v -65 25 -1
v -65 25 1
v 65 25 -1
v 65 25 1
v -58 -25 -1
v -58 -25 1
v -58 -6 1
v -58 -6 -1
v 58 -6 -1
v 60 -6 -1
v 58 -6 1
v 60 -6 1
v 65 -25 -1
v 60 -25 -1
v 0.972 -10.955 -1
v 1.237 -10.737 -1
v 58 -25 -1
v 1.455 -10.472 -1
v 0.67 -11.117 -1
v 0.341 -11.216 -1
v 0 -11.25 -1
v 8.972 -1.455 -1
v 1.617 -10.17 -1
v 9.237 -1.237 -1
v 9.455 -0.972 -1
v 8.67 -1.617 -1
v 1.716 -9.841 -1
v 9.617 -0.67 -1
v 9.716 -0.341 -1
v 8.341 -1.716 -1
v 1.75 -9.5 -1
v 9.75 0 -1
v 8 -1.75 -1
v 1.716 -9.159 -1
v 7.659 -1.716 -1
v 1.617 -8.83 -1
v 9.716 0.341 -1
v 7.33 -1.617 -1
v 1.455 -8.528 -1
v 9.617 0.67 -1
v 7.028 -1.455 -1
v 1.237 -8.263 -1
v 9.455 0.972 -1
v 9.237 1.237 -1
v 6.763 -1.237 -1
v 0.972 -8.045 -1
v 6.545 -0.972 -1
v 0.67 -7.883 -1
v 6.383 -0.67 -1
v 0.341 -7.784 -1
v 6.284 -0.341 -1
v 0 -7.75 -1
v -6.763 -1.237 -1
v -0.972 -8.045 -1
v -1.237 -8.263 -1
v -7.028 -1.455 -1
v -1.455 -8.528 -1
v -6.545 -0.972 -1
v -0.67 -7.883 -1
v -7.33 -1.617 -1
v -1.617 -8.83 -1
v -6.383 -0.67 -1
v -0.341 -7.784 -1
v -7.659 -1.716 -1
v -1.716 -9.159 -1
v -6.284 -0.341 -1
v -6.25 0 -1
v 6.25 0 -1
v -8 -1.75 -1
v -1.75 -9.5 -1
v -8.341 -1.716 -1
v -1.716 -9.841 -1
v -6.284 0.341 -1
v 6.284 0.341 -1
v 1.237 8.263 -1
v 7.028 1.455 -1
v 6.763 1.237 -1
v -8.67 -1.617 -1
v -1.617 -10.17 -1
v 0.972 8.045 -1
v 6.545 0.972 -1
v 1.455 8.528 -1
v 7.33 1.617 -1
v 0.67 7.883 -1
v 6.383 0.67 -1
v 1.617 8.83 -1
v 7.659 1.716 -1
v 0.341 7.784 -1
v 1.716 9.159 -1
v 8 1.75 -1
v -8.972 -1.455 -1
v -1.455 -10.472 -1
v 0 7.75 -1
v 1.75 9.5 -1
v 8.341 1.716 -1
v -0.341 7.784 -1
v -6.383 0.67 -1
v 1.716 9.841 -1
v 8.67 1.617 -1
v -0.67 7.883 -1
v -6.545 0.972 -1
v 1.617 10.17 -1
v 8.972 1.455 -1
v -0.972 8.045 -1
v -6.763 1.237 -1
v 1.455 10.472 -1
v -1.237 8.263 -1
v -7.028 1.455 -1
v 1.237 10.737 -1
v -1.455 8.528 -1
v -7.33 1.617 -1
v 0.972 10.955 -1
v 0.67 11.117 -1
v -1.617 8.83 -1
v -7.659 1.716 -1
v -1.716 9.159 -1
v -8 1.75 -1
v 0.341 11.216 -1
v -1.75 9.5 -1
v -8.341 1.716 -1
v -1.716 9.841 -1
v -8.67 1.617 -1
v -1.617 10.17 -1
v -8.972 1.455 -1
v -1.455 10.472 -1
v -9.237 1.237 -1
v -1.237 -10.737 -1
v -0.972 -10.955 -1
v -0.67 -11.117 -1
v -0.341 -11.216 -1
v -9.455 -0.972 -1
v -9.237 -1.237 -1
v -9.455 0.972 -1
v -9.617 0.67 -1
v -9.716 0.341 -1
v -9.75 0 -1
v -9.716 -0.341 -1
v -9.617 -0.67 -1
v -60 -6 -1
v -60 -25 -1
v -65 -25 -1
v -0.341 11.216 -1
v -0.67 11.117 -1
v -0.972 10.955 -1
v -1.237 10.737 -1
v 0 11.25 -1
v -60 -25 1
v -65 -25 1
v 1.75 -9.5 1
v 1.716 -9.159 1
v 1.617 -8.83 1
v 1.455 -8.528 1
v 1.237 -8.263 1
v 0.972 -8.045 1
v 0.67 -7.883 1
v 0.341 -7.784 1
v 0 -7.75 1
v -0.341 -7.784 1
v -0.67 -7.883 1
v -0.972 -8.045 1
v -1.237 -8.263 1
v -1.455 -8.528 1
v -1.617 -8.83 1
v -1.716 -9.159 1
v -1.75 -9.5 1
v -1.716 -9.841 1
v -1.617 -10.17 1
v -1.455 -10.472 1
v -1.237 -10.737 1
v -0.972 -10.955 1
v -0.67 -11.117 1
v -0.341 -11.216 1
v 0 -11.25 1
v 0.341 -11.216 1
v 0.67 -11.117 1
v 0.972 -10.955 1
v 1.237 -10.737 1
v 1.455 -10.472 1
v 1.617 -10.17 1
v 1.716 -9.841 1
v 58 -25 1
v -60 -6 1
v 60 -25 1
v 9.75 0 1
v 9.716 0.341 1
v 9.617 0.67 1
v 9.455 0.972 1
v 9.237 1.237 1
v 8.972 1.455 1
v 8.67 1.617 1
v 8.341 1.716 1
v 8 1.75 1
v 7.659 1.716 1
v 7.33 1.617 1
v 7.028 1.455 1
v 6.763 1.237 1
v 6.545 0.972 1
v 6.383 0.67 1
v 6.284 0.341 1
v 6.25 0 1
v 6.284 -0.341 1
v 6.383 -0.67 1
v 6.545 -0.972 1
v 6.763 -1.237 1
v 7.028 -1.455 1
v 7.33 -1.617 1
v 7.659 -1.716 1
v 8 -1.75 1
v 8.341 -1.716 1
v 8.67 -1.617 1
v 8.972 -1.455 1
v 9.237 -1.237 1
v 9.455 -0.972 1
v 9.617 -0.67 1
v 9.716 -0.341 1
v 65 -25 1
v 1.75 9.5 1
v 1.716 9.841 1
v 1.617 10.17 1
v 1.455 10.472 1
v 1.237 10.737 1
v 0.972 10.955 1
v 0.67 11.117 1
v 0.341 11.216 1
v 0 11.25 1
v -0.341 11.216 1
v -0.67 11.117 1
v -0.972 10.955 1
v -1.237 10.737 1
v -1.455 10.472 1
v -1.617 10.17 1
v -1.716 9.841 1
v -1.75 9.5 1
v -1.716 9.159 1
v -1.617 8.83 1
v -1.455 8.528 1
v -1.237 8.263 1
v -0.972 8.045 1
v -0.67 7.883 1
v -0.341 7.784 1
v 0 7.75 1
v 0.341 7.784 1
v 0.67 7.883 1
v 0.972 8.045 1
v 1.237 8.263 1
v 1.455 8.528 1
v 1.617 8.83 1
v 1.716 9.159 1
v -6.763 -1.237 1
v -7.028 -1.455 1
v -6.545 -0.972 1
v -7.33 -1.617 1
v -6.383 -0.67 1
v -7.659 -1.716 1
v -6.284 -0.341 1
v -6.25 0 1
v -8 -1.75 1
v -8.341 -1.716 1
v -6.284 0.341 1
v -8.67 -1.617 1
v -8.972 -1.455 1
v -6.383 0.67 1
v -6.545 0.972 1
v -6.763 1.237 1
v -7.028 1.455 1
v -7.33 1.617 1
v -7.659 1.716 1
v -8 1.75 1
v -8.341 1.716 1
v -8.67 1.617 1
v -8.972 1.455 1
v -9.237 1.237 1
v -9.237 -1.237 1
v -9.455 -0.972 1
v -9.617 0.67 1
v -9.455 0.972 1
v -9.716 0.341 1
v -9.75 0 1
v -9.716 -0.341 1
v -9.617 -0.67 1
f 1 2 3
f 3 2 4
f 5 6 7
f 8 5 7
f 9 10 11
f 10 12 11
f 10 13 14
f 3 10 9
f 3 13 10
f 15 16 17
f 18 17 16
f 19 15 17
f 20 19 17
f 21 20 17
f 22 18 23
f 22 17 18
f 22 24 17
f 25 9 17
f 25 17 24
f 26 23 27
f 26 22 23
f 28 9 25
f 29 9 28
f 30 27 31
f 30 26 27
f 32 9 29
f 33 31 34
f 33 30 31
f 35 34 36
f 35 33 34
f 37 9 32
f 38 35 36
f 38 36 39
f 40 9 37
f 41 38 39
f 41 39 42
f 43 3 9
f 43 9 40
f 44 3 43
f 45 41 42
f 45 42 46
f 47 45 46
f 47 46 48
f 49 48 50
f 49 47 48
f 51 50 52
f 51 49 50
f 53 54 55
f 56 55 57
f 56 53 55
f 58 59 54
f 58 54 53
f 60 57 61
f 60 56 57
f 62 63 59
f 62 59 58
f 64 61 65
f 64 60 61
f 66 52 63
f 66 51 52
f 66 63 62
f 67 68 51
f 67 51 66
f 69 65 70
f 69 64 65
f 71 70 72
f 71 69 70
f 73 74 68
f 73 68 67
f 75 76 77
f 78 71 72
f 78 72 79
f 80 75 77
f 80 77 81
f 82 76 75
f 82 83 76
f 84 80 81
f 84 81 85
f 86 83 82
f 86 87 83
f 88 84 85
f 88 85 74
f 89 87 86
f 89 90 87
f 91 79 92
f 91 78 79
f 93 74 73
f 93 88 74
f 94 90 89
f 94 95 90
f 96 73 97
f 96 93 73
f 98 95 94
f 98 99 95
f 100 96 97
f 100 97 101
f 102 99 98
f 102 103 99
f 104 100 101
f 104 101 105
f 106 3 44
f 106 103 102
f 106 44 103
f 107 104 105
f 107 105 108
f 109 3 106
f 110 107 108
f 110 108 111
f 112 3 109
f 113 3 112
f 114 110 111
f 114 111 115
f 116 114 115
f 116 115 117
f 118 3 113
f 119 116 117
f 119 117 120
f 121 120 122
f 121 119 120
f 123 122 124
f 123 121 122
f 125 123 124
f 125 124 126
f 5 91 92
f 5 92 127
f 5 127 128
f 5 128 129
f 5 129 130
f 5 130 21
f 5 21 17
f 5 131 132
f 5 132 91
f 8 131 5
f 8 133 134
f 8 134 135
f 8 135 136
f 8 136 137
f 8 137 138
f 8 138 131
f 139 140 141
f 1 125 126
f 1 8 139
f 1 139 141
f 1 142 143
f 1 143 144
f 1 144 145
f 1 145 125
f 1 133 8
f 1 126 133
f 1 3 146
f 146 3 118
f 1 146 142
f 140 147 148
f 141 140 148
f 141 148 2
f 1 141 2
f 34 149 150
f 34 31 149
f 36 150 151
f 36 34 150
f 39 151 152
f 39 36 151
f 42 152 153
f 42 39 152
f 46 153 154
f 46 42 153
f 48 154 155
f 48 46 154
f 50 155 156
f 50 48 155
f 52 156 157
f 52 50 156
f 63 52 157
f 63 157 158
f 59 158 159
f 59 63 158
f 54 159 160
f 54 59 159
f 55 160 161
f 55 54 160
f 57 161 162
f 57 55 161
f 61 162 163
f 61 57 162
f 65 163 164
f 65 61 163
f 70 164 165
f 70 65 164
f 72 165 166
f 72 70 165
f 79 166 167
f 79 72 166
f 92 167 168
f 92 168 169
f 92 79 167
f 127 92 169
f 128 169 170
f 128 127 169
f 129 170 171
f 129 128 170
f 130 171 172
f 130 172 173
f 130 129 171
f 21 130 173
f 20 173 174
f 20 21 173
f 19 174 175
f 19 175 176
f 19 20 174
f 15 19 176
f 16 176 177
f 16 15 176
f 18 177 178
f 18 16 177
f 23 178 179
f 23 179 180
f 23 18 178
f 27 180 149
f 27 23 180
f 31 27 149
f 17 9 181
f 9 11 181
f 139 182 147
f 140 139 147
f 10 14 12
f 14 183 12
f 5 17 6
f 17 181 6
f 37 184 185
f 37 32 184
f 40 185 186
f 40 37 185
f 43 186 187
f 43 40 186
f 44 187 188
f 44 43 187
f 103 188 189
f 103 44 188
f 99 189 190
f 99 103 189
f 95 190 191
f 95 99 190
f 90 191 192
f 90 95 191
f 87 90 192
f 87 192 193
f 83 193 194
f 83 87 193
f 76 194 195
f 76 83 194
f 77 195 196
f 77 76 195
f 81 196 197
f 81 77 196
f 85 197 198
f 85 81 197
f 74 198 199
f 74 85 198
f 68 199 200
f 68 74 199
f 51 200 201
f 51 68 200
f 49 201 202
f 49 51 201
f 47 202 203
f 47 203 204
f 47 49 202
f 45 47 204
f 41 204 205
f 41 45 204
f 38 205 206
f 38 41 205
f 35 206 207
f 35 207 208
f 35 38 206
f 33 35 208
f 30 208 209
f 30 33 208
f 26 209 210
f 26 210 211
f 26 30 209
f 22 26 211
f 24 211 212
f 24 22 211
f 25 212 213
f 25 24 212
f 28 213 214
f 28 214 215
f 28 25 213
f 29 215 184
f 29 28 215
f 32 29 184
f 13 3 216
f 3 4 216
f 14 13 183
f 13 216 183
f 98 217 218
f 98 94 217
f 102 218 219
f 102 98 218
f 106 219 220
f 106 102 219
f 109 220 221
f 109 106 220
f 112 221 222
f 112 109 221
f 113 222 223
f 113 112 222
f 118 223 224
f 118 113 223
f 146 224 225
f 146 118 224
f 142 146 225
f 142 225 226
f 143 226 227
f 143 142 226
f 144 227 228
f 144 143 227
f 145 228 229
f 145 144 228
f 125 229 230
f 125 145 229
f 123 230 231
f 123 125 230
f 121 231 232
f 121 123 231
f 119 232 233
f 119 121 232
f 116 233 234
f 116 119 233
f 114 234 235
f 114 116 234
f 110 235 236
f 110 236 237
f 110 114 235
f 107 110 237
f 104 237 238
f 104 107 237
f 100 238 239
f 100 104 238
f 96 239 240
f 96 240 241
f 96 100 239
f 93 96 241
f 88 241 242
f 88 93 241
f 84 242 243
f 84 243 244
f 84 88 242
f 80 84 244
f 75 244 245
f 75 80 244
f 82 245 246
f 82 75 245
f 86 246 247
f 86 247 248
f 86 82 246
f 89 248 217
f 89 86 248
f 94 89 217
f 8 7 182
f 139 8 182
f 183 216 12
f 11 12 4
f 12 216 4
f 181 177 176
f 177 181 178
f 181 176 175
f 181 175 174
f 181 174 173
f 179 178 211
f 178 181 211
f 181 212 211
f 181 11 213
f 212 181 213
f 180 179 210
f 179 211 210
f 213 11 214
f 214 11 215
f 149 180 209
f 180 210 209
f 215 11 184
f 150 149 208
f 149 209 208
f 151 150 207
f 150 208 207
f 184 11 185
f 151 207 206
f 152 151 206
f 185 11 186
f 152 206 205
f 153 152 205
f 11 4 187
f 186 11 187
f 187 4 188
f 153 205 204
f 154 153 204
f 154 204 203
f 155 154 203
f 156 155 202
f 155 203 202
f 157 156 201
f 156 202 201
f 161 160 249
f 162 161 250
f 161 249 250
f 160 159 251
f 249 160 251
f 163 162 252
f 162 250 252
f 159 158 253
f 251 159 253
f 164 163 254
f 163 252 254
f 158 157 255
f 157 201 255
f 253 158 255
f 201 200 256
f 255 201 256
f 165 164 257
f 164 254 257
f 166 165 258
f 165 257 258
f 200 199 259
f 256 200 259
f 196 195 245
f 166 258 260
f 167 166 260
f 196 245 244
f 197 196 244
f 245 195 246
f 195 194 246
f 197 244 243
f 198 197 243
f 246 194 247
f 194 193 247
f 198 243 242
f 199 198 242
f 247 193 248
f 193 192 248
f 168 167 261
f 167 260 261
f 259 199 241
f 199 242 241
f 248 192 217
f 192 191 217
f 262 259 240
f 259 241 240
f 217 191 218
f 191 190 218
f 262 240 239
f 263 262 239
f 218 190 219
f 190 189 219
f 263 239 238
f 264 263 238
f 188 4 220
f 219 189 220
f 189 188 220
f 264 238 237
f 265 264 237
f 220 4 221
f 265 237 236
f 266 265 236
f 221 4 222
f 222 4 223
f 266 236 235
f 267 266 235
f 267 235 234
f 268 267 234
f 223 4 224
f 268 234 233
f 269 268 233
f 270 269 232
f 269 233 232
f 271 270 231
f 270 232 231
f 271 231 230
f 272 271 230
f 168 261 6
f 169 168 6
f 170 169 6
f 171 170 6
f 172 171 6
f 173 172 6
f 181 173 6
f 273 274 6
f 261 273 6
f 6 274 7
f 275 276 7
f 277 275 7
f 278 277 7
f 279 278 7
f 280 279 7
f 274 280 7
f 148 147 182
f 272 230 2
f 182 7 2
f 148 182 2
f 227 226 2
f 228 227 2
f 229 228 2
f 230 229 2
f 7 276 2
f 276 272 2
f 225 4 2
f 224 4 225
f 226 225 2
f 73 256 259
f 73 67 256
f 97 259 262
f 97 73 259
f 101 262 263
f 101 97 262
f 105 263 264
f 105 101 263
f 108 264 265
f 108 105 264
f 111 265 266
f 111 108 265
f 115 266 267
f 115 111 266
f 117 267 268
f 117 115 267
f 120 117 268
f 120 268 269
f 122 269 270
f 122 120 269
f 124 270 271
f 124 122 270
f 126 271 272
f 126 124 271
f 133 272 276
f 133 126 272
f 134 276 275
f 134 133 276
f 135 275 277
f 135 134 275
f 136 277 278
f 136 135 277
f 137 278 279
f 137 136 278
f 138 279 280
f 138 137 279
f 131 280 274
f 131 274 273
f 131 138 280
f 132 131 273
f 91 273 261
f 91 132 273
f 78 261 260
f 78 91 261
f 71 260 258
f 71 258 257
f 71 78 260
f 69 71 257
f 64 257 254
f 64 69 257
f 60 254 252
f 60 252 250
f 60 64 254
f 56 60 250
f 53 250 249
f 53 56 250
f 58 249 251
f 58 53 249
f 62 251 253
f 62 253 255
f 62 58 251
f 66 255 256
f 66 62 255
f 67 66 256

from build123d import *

# Parameters (mm, degrees)
SKETCH1_R           = 1.75
BOSS_EXTRUDE1_DEPTH = 1


with BuildPart() as part:
    # Sketch1 → Boss-Extrude1 (new, symmetric)
    with BuildSketch(Plane.XY):
        Polygon((-65, 25), (65, 25), (65, -25), (60, -25), (60, -6), (58, -6), (58, -25), (-58, -25), (-58, -6), (-60, -6), (-60, -25), (-65, -25), align=None)
        with Locations((0, 9.5)):
            Circle(SKETCH1_R, mode=Mode.SUBTRACT)
        with Locations((8, 0)):
            Circle(SKETCH1_R, mode=Mode.SUBTRACT)
        with Locations((0, -9.5)):
            Circle(SKETCH1_R, mode=Mode.SUBTRACT)
        with Locations((-8, 0)):
            Circle(SKETCH1_R, mode=Mode.SUBTRACT)
    extrude(amount=BOSS_EXTRUDE1_DEPTH, both=True)


solid = part.part
